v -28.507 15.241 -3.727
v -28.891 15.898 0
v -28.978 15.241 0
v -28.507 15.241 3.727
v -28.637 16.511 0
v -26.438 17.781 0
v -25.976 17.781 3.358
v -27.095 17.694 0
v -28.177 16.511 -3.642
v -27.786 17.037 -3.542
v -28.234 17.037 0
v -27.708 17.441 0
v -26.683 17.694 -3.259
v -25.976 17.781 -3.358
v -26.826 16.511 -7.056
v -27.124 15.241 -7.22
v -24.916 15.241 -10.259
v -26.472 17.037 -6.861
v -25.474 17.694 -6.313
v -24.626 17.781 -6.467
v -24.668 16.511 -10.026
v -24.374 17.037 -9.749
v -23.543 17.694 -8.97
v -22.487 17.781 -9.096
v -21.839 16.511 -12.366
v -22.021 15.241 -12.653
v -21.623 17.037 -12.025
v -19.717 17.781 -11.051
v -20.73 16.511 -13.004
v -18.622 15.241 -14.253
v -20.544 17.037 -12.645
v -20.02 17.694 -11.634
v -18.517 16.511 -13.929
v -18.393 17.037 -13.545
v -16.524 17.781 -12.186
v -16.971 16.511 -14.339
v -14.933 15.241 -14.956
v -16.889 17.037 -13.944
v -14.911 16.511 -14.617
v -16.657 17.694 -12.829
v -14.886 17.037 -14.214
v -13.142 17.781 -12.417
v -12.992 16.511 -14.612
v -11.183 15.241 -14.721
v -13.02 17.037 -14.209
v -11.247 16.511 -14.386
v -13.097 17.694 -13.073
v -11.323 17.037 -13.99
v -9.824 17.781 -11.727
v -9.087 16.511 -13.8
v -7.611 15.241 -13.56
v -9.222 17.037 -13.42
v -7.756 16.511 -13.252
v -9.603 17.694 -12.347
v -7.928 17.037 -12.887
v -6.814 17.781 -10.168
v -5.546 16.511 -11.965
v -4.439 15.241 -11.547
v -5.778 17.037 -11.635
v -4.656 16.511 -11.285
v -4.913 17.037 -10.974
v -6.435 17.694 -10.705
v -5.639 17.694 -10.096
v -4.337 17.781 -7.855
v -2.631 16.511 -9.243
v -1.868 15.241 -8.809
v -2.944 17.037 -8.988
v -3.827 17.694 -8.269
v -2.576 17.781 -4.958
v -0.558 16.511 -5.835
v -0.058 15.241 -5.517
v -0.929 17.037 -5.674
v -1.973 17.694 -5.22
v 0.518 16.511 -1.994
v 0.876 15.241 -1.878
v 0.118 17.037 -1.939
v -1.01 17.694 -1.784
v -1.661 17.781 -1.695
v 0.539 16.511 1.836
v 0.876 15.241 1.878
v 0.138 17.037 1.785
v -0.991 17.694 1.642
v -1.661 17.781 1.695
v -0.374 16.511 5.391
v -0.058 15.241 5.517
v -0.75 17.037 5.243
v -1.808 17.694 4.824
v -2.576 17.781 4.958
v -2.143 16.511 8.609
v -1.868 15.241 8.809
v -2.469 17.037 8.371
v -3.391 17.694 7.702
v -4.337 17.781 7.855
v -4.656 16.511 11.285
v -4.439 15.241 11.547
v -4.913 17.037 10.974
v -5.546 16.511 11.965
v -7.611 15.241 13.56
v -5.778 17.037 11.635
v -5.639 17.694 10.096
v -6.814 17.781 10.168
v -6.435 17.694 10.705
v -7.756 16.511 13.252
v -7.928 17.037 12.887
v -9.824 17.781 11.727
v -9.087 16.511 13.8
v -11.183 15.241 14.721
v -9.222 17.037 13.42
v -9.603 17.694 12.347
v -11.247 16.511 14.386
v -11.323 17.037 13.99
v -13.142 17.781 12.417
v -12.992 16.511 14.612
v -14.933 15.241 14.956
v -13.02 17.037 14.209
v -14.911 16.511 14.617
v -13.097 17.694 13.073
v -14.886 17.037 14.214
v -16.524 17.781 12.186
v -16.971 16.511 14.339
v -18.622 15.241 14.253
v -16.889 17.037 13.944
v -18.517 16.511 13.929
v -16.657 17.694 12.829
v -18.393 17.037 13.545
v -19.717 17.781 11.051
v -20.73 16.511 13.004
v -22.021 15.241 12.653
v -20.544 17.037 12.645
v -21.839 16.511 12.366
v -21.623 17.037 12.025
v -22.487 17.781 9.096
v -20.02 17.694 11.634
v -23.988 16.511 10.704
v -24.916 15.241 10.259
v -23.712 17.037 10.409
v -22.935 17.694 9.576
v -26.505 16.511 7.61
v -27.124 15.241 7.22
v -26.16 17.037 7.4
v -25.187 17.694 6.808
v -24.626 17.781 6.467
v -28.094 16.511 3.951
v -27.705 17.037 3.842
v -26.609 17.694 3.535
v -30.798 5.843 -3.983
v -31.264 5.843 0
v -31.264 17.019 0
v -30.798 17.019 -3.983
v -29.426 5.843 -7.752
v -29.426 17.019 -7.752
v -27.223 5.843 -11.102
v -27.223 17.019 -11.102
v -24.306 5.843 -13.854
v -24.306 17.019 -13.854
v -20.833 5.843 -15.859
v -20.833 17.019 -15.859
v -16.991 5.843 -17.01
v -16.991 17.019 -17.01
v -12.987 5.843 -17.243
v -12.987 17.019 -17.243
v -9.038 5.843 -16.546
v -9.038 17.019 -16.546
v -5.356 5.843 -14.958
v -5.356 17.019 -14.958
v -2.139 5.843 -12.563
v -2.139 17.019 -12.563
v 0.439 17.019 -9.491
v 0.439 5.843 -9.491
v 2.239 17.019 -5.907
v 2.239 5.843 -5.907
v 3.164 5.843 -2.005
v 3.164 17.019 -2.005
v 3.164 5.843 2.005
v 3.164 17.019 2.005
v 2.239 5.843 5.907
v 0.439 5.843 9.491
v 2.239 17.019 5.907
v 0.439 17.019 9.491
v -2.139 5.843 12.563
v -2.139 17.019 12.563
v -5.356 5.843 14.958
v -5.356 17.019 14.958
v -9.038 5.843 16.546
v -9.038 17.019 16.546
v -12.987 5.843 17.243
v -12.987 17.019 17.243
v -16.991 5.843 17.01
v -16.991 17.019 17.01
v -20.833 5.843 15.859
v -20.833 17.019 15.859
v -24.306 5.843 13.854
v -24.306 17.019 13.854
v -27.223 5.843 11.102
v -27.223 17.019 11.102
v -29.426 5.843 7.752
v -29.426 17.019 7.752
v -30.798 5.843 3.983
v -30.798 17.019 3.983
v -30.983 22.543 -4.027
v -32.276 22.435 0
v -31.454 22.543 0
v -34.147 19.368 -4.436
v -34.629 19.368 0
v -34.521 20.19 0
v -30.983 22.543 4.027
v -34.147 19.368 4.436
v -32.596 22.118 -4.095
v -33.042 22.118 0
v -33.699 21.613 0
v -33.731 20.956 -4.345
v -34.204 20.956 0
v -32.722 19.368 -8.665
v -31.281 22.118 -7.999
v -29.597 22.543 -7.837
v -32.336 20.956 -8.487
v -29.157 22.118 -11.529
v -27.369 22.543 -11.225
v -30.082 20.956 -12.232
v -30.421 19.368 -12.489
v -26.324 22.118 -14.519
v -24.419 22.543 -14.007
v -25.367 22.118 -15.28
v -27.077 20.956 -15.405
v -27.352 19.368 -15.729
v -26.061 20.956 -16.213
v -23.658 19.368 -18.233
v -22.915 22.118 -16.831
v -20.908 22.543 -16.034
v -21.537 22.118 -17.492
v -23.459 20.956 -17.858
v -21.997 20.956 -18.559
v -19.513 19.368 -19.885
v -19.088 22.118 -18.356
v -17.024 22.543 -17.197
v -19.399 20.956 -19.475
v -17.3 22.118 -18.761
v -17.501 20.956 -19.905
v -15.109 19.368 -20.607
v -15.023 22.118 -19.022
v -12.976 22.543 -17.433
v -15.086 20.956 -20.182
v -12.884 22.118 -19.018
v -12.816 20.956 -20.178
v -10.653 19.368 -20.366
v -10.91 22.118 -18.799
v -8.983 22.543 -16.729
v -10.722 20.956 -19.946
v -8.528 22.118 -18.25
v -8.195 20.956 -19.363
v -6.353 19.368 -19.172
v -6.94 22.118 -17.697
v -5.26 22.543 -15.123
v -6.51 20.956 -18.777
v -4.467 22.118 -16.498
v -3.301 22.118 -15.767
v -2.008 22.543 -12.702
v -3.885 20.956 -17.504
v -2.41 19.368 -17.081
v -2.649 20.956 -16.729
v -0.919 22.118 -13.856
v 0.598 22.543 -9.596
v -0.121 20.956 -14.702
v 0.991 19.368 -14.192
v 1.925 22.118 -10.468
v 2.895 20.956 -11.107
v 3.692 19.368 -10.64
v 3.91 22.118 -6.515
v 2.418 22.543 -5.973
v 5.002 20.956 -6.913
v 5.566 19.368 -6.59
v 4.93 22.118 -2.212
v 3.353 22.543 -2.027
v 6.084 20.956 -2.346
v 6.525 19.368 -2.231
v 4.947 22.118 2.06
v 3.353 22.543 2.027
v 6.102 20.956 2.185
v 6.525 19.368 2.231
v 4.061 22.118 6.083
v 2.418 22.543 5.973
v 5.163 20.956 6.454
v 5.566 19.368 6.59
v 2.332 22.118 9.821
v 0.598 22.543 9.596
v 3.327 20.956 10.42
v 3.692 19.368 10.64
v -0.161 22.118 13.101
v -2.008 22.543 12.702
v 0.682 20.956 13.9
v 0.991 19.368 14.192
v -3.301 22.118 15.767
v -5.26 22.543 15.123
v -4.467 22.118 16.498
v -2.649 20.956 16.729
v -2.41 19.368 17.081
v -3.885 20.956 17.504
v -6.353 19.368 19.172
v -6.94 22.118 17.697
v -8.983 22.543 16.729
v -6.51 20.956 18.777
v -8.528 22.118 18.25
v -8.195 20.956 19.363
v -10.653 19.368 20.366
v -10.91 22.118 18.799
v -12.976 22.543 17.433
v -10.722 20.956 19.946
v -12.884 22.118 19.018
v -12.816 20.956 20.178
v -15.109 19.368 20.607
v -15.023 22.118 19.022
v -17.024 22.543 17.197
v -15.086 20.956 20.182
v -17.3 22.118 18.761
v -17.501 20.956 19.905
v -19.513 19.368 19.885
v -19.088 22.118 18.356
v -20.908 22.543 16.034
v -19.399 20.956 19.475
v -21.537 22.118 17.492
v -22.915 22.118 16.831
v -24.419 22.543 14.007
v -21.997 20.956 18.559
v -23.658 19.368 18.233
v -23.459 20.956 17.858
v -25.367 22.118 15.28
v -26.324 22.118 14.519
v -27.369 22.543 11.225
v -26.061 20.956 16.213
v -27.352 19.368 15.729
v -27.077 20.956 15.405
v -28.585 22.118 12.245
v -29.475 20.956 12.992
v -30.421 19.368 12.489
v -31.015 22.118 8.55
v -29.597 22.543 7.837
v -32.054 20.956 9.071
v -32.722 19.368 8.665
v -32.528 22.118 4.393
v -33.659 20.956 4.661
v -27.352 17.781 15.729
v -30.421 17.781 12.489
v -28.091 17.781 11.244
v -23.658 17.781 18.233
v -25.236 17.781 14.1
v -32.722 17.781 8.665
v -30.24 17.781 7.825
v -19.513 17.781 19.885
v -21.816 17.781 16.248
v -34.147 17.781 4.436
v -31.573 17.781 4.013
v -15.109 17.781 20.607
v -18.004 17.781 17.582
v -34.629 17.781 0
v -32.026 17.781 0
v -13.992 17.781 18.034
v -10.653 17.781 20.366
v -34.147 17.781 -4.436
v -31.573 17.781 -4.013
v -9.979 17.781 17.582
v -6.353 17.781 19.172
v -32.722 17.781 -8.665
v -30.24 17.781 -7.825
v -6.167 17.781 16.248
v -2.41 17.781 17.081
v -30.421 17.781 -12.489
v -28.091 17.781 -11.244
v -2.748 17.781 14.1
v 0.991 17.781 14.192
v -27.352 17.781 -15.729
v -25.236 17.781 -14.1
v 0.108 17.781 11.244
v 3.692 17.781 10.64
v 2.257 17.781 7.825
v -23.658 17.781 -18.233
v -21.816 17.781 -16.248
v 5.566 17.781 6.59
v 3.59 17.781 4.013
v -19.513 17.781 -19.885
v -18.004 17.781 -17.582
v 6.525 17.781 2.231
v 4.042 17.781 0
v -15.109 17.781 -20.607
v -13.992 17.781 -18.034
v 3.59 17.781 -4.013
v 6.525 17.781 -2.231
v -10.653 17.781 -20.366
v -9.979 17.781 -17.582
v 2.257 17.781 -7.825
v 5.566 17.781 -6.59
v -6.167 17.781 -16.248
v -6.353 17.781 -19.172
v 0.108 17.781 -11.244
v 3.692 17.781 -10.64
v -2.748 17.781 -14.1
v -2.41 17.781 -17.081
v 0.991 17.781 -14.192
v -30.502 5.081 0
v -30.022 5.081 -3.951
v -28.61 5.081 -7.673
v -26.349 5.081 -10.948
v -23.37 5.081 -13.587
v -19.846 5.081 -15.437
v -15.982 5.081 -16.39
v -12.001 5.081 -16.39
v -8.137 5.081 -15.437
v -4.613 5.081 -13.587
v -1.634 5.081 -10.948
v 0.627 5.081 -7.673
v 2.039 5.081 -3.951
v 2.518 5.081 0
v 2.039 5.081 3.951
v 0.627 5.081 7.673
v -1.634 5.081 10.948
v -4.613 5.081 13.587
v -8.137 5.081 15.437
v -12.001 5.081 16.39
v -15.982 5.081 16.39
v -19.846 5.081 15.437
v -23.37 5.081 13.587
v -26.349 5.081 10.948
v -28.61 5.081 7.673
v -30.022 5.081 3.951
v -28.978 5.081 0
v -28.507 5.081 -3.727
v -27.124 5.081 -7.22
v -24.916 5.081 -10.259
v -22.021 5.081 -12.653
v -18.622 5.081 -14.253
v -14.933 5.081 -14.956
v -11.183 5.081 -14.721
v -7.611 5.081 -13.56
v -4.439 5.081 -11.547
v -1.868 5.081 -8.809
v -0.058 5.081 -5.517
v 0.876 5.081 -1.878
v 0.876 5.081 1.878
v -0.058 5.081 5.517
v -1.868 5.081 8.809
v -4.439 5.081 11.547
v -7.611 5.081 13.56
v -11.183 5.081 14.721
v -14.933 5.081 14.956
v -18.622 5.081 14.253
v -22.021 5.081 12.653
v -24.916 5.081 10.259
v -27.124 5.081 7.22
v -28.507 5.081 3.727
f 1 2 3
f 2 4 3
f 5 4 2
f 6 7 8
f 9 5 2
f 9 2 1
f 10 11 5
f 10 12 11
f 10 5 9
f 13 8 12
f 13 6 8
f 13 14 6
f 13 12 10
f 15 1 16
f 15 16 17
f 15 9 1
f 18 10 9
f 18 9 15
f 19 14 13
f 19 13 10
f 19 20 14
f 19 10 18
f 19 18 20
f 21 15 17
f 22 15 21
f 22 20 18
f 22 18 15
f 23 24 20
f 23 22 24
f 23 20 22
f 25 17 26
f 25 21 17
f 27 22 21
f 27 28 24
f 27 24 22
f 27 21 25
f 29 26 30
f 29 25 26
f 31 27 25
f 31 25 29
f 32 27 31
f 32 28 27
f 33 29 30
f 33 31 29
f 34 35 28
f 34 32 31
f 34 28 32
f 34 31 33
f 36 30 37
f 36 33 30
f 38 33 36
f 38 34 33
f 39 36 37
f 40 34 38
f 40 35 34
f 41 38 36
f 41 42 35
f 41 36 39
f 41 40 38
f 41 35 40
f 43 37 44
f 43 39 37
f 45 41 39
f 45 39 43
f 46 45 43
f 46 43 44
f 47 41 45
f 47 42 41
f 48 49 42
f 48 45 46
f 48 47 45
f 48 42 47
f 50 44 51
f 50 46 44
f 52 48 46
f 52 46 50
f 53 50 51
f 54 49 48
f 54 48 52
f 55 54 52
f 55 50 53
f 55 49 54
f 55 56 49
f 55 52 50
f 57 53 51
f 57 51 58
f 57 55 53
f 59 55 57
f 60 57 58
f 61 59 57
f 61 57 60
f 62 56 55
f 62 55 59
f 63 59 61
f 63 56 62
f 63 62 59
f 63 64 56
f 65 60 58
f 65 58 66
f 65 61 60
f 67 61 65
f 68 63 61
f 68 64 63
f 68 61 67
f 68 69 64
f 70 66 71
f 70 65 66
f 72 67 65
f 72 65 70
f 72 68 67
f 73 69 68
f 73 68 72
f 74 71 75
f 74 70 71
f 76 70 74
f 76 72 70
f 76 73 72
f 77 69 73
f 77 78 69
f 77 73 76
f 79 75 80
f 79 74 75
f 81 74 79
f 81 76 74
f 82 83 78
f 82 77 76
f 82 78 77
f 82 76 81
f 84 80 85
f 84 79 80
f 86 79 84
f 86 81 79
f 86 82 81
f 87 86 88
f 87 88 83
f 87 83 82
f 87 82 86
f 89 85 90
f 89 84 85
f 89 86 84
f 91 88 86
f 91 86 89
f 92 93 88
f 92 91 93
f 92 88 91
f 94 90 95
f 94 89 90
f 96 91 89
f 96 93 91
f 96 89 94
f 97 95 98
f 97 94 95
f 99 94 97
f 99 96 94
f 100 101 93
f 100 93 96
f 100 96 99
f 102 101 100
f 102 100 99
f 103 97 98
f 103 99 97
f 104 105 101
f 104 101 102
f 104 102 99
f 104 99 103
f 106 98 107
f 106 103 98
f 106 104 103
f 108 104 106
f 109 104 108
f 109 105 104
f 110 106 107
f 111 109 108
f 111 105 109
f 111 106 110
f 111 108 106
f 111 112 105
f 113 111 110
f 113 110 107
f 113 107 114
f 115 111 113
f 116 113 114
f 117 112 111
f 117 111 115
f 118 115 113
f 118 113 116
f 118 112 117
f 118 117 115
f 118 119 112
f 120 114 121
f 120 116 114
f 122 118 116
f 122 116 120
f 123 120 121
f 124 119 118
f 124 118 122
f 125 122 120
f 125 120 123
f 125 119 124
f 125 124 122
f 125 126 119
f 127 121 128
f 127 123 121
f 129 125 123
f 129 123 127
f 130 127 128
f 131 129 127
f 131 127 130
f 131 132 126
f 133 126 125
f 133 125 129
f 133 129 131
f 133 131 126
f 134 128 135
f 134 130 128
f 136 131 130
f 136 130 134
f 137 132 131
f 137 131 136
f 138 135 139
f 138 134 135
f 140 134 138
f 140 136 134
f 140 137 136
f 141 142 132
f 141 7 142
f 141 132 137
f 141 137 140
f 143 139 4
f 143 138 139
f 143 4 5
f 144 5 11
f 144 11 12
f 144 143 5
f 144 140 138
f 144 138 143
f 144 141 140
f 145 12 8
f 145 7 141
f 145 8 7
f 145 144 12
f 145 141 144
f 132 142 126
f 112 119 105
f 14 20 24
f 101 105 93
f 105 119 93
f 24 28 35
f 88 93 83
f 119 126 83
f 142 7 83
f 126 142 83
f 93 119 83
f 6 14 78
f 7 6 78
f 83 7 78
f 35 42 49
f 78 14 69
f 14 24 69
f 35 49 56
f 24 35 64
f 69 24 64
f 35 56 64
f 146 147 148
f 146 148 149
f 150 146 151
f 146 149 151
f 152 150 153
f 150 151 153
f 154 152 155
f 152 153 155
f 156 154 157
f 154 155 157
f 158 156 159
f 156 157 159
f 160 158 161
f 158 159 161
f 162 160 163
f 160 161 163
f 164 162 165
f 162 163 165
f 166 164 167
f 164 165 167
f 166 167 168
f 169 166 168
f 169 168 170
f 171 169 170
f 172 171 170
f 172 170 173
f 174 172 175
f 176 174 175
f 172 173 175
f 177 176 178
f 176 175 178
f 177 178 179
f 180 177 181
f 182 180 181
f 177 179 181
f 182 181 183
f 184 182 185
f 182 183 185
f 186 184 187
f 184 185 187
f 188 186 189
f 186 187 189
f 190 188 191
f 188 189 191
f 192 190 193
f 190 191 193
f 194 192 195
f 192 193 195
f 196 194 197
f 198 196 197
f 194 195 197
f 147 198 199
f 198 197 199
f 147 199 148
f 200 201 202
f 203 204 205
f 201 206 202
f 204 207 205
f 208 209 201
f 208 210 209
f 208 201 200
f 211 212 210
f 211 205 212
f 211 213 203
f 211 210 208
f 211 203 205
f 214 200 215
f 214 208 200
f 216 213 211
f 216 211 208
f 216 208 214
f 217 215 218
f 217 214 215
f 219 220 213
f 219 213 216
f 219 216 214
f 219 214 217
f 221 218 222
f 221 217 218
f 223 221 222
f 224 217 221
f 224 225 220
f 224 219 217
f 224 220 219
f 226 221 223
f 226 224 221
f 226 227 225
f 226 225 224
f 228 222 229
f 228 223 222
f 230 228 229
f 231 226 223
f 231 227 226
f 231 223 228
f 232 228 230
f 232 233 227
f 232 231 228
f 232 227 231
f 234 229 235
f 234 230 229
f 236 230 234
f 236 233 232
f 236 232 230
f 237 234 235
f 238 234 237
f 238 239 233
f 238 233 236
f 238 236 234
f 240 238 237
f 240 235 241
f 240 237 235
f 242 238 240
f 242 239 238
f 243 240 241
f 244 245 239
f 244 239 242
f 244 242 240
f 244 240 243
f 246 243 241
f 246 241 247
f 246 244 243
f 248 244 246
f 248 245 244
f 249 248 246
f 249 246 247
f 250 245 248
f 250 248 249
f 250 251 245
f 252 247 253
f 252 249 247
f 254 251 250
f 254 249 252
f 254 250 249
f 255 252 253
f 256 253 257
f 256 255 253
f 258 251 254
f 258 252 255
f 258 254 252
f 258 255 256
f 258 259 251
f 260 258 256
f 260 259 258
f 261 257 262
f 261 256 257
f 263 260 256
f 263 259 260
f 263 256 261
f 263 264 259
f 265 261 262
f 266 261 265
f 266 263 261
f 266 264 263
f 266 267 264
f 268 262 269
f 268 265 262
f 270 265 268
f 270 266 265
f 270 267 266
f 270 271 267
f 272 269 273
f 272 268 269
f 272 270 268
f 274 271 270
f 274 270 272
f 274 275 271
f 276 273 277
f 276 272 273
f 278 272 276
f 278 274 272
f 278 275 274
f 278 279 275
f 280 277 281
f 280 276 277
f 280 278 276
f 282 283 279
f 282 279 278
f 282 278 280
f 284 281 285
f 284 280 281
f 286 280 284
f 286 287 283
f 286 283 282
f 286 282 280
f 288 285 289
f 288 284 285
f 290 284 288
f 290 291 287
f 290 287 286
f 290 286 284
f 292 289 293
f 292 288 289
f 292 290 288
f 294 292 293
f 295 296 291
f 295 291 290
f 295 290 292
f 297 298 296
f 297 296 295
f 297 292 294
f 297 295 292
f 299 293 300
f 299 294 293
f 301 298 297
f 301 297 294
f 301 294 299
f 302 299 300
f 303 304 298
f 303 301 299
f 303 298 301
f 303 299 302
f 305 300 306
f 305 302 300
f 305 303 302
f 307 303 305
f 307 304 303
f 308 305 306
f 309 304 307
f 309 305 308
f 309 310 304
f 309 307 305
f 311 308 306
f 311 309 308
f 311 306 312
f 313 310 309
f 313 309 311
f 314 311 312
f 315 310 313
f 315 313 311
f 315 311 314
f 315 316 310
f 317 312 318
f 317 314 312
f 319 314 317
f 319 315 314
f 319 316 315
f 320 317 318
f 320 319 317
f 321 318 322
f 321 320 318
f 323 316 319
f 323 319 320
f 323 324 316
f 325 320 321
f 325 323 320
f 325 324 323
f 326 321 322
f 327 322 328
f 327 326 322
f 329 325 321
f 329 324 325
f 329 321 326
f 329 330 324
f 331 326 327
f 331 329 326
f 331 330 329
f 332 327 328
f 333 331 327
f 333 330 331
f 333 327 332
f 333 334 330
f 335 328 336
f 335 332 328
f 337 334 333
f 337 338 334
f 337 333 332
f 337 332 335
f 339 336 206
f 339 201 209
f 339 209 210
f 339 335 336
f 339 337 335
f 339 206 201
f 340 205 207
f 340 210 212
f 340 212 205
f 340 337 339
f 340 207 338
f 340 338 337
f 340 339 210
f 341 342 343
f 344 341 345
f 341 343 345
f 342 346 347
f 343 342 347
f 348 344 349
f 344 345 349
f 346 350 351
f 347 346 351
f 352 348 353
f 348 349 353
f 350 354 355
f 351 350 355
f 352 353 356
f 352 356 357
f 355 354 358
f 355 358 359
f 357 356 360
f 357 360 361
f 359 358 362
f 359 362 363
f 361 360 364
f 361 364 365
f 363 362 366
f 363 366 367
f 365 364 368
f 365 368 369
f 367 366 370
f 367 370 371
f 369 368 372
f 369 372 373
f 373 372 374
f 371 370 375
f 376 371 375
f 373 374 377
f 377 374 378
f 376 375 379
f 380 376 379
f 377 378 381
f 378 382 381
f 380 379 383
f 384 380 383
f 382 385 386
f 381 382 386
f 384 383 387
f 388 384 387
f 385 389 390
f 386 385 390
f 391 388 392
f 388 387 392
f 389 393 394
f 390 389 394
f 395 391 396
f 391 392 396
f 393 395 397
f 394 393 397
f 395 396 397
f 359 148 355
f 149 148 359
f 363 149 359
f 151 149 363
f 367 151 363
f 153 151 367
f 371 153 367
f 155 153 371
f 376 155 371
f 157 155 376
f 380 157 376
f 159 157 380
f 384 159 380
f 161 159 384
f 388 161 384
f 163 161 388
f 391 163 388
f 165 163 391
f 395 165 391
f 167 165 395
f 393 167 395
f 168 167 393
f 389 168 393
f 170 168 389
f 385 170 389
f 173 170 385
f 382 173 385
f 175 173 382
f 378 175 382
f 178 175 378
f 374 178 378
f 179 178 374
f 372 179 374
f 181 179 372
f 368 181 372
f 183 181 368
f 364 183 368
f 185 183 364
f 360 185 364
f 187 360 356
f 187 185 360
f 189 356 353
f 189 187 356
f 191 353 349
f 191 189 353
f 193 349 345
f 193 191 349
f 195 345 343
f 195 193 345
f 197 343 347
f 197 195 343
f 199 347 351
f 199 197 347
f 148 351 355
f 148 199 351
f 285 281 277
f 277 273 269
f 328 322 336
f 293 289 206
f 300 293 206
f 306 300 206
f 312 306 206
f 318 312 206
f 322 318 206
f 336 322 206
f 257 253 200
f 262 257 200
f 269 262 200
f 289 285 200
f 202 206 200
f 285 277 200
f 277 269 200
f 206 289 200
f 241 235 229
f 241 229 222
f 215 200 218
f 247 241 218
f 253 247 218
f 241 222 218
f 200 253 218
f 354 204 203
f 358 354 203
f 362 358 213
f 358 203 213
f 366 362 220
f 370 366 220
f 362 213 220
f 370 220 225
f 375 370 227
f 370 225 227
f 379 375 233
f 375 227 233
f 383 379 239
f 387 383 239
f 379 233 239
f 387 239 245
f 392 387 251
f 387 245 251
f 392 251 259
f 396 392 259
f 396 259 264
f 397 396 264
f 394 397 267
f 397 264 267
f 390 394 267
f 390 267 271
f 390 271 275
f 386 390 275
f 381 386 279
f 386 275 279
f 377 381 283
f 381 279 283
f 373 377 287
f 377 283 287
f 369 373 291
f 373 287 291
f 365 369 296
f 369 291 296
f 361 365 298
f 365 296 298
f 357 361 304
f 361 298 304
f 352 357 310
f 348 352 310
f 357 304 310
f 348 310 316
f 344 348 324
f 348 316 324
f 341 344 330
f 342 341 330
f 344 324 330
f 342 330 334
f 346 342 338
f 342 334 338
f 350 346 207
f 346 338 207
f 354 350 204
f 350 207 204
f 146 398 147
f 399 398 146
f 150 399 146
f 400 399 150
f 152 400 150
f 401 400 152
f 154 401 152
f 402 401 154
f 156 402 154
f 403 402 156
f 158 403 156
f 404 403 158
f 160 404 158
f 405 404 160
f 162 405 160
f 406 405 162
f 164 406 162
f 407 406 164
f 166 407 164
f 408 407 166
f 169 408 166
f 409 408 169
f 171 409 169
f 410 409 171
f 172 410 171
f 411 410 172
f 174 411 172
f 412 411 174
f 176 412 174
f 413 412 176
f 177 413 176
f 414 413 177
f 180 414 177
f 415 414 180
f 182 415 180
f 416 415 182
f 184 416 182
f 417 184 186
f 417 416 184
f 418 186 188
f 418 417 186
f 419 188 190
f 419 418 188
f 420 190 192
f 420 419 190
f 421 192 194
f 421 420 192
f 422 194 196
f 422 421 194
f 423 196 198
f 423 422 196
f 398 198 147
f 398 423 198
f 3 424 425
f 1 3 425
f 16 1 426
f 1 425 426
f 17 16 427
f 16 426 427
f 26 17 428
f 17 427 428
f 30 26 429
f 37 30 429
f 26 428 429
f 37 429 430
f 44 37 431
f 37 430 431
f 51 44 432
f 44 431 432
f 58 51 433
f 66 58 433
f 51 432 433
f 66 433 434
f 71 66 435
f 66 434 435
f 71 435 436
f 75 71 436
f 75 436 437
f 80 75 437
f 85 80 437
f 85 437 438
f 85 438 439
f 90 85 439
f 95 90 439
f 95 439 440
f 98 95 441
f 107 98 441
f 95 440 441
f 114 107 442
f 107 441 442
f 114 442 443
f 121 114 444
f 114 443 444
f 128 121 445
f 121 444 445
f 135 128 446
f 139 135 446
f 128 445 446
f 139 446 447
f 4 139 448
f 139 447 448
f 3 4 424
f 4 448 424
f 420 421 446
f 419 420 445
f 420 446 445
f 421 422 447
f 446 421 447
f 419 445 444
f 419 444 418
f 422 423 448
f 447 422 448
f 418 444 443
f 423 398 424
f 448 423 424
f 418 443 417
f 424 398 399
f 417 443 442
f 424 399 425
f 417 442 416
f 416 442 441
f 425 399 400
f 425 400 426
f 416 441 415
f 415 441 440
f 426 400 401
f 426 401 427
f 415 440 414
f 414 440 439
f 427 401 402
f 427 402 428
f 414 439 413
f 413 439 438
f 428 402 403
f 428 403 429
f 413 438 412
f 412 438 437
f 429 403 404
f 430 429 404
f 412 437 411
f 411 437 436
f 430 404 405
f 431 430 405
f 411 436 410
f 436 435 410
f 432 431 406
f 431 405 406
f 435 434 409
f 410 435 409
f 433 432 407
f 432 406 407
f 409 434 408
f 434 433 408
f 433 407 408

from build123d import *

# Parameters (mm, degrees)
FILLET1_R     = 3.175
CHAMFER1_SIZE = 0.762
FILLET2_R     = 2.54


with BuildPart() as part:
    # Sketch3 → Revolve1 (revolve)
    with BuildSketch(Plane.XY):
        Polygon((-34.629025424, 22.543396893), (-13.991525424, 22.543396893), (-13.991525424, 17.780896893), (-28.977525424, 17.780896893), (-28.977525424, 5.080896893), (-31.263525424, 5.080896893), (-31.263525424, 17.780896893), (-34.629025424, 17.780896893), align=None)
    revolve(axis=Axis((-13.991525424, 22.543396893, 0), (0, -1, 0)))

    # Fillet1
    fillet1_edges = [part.edges().sort_by_distance(p)[0] for p in [
        (6.645974576, 22.543396893, 0),
    ]]
    fillet(fillet1_edges, radius=FILLET1_R)

    # Chamfer1
    chamfer1_edges = [part.edges().sort_by_distance(p)[0] for p in [
        (3.280474576, 17.780896893, 0),
        (3.280474576, 5.080896893, 0),
    ]]
    chamfer(chamfer1_edges, length=CHAMFER1_SIZE)

    # Fillet2
    fillet2_edges = [part.edges().sort_by_distance(p)[0] for p in [
        (0.994474576, 17.780896893, 0),
    ]]
    fillet(fillet2_edges, radius=FILLET2_R)


solid = part.part
